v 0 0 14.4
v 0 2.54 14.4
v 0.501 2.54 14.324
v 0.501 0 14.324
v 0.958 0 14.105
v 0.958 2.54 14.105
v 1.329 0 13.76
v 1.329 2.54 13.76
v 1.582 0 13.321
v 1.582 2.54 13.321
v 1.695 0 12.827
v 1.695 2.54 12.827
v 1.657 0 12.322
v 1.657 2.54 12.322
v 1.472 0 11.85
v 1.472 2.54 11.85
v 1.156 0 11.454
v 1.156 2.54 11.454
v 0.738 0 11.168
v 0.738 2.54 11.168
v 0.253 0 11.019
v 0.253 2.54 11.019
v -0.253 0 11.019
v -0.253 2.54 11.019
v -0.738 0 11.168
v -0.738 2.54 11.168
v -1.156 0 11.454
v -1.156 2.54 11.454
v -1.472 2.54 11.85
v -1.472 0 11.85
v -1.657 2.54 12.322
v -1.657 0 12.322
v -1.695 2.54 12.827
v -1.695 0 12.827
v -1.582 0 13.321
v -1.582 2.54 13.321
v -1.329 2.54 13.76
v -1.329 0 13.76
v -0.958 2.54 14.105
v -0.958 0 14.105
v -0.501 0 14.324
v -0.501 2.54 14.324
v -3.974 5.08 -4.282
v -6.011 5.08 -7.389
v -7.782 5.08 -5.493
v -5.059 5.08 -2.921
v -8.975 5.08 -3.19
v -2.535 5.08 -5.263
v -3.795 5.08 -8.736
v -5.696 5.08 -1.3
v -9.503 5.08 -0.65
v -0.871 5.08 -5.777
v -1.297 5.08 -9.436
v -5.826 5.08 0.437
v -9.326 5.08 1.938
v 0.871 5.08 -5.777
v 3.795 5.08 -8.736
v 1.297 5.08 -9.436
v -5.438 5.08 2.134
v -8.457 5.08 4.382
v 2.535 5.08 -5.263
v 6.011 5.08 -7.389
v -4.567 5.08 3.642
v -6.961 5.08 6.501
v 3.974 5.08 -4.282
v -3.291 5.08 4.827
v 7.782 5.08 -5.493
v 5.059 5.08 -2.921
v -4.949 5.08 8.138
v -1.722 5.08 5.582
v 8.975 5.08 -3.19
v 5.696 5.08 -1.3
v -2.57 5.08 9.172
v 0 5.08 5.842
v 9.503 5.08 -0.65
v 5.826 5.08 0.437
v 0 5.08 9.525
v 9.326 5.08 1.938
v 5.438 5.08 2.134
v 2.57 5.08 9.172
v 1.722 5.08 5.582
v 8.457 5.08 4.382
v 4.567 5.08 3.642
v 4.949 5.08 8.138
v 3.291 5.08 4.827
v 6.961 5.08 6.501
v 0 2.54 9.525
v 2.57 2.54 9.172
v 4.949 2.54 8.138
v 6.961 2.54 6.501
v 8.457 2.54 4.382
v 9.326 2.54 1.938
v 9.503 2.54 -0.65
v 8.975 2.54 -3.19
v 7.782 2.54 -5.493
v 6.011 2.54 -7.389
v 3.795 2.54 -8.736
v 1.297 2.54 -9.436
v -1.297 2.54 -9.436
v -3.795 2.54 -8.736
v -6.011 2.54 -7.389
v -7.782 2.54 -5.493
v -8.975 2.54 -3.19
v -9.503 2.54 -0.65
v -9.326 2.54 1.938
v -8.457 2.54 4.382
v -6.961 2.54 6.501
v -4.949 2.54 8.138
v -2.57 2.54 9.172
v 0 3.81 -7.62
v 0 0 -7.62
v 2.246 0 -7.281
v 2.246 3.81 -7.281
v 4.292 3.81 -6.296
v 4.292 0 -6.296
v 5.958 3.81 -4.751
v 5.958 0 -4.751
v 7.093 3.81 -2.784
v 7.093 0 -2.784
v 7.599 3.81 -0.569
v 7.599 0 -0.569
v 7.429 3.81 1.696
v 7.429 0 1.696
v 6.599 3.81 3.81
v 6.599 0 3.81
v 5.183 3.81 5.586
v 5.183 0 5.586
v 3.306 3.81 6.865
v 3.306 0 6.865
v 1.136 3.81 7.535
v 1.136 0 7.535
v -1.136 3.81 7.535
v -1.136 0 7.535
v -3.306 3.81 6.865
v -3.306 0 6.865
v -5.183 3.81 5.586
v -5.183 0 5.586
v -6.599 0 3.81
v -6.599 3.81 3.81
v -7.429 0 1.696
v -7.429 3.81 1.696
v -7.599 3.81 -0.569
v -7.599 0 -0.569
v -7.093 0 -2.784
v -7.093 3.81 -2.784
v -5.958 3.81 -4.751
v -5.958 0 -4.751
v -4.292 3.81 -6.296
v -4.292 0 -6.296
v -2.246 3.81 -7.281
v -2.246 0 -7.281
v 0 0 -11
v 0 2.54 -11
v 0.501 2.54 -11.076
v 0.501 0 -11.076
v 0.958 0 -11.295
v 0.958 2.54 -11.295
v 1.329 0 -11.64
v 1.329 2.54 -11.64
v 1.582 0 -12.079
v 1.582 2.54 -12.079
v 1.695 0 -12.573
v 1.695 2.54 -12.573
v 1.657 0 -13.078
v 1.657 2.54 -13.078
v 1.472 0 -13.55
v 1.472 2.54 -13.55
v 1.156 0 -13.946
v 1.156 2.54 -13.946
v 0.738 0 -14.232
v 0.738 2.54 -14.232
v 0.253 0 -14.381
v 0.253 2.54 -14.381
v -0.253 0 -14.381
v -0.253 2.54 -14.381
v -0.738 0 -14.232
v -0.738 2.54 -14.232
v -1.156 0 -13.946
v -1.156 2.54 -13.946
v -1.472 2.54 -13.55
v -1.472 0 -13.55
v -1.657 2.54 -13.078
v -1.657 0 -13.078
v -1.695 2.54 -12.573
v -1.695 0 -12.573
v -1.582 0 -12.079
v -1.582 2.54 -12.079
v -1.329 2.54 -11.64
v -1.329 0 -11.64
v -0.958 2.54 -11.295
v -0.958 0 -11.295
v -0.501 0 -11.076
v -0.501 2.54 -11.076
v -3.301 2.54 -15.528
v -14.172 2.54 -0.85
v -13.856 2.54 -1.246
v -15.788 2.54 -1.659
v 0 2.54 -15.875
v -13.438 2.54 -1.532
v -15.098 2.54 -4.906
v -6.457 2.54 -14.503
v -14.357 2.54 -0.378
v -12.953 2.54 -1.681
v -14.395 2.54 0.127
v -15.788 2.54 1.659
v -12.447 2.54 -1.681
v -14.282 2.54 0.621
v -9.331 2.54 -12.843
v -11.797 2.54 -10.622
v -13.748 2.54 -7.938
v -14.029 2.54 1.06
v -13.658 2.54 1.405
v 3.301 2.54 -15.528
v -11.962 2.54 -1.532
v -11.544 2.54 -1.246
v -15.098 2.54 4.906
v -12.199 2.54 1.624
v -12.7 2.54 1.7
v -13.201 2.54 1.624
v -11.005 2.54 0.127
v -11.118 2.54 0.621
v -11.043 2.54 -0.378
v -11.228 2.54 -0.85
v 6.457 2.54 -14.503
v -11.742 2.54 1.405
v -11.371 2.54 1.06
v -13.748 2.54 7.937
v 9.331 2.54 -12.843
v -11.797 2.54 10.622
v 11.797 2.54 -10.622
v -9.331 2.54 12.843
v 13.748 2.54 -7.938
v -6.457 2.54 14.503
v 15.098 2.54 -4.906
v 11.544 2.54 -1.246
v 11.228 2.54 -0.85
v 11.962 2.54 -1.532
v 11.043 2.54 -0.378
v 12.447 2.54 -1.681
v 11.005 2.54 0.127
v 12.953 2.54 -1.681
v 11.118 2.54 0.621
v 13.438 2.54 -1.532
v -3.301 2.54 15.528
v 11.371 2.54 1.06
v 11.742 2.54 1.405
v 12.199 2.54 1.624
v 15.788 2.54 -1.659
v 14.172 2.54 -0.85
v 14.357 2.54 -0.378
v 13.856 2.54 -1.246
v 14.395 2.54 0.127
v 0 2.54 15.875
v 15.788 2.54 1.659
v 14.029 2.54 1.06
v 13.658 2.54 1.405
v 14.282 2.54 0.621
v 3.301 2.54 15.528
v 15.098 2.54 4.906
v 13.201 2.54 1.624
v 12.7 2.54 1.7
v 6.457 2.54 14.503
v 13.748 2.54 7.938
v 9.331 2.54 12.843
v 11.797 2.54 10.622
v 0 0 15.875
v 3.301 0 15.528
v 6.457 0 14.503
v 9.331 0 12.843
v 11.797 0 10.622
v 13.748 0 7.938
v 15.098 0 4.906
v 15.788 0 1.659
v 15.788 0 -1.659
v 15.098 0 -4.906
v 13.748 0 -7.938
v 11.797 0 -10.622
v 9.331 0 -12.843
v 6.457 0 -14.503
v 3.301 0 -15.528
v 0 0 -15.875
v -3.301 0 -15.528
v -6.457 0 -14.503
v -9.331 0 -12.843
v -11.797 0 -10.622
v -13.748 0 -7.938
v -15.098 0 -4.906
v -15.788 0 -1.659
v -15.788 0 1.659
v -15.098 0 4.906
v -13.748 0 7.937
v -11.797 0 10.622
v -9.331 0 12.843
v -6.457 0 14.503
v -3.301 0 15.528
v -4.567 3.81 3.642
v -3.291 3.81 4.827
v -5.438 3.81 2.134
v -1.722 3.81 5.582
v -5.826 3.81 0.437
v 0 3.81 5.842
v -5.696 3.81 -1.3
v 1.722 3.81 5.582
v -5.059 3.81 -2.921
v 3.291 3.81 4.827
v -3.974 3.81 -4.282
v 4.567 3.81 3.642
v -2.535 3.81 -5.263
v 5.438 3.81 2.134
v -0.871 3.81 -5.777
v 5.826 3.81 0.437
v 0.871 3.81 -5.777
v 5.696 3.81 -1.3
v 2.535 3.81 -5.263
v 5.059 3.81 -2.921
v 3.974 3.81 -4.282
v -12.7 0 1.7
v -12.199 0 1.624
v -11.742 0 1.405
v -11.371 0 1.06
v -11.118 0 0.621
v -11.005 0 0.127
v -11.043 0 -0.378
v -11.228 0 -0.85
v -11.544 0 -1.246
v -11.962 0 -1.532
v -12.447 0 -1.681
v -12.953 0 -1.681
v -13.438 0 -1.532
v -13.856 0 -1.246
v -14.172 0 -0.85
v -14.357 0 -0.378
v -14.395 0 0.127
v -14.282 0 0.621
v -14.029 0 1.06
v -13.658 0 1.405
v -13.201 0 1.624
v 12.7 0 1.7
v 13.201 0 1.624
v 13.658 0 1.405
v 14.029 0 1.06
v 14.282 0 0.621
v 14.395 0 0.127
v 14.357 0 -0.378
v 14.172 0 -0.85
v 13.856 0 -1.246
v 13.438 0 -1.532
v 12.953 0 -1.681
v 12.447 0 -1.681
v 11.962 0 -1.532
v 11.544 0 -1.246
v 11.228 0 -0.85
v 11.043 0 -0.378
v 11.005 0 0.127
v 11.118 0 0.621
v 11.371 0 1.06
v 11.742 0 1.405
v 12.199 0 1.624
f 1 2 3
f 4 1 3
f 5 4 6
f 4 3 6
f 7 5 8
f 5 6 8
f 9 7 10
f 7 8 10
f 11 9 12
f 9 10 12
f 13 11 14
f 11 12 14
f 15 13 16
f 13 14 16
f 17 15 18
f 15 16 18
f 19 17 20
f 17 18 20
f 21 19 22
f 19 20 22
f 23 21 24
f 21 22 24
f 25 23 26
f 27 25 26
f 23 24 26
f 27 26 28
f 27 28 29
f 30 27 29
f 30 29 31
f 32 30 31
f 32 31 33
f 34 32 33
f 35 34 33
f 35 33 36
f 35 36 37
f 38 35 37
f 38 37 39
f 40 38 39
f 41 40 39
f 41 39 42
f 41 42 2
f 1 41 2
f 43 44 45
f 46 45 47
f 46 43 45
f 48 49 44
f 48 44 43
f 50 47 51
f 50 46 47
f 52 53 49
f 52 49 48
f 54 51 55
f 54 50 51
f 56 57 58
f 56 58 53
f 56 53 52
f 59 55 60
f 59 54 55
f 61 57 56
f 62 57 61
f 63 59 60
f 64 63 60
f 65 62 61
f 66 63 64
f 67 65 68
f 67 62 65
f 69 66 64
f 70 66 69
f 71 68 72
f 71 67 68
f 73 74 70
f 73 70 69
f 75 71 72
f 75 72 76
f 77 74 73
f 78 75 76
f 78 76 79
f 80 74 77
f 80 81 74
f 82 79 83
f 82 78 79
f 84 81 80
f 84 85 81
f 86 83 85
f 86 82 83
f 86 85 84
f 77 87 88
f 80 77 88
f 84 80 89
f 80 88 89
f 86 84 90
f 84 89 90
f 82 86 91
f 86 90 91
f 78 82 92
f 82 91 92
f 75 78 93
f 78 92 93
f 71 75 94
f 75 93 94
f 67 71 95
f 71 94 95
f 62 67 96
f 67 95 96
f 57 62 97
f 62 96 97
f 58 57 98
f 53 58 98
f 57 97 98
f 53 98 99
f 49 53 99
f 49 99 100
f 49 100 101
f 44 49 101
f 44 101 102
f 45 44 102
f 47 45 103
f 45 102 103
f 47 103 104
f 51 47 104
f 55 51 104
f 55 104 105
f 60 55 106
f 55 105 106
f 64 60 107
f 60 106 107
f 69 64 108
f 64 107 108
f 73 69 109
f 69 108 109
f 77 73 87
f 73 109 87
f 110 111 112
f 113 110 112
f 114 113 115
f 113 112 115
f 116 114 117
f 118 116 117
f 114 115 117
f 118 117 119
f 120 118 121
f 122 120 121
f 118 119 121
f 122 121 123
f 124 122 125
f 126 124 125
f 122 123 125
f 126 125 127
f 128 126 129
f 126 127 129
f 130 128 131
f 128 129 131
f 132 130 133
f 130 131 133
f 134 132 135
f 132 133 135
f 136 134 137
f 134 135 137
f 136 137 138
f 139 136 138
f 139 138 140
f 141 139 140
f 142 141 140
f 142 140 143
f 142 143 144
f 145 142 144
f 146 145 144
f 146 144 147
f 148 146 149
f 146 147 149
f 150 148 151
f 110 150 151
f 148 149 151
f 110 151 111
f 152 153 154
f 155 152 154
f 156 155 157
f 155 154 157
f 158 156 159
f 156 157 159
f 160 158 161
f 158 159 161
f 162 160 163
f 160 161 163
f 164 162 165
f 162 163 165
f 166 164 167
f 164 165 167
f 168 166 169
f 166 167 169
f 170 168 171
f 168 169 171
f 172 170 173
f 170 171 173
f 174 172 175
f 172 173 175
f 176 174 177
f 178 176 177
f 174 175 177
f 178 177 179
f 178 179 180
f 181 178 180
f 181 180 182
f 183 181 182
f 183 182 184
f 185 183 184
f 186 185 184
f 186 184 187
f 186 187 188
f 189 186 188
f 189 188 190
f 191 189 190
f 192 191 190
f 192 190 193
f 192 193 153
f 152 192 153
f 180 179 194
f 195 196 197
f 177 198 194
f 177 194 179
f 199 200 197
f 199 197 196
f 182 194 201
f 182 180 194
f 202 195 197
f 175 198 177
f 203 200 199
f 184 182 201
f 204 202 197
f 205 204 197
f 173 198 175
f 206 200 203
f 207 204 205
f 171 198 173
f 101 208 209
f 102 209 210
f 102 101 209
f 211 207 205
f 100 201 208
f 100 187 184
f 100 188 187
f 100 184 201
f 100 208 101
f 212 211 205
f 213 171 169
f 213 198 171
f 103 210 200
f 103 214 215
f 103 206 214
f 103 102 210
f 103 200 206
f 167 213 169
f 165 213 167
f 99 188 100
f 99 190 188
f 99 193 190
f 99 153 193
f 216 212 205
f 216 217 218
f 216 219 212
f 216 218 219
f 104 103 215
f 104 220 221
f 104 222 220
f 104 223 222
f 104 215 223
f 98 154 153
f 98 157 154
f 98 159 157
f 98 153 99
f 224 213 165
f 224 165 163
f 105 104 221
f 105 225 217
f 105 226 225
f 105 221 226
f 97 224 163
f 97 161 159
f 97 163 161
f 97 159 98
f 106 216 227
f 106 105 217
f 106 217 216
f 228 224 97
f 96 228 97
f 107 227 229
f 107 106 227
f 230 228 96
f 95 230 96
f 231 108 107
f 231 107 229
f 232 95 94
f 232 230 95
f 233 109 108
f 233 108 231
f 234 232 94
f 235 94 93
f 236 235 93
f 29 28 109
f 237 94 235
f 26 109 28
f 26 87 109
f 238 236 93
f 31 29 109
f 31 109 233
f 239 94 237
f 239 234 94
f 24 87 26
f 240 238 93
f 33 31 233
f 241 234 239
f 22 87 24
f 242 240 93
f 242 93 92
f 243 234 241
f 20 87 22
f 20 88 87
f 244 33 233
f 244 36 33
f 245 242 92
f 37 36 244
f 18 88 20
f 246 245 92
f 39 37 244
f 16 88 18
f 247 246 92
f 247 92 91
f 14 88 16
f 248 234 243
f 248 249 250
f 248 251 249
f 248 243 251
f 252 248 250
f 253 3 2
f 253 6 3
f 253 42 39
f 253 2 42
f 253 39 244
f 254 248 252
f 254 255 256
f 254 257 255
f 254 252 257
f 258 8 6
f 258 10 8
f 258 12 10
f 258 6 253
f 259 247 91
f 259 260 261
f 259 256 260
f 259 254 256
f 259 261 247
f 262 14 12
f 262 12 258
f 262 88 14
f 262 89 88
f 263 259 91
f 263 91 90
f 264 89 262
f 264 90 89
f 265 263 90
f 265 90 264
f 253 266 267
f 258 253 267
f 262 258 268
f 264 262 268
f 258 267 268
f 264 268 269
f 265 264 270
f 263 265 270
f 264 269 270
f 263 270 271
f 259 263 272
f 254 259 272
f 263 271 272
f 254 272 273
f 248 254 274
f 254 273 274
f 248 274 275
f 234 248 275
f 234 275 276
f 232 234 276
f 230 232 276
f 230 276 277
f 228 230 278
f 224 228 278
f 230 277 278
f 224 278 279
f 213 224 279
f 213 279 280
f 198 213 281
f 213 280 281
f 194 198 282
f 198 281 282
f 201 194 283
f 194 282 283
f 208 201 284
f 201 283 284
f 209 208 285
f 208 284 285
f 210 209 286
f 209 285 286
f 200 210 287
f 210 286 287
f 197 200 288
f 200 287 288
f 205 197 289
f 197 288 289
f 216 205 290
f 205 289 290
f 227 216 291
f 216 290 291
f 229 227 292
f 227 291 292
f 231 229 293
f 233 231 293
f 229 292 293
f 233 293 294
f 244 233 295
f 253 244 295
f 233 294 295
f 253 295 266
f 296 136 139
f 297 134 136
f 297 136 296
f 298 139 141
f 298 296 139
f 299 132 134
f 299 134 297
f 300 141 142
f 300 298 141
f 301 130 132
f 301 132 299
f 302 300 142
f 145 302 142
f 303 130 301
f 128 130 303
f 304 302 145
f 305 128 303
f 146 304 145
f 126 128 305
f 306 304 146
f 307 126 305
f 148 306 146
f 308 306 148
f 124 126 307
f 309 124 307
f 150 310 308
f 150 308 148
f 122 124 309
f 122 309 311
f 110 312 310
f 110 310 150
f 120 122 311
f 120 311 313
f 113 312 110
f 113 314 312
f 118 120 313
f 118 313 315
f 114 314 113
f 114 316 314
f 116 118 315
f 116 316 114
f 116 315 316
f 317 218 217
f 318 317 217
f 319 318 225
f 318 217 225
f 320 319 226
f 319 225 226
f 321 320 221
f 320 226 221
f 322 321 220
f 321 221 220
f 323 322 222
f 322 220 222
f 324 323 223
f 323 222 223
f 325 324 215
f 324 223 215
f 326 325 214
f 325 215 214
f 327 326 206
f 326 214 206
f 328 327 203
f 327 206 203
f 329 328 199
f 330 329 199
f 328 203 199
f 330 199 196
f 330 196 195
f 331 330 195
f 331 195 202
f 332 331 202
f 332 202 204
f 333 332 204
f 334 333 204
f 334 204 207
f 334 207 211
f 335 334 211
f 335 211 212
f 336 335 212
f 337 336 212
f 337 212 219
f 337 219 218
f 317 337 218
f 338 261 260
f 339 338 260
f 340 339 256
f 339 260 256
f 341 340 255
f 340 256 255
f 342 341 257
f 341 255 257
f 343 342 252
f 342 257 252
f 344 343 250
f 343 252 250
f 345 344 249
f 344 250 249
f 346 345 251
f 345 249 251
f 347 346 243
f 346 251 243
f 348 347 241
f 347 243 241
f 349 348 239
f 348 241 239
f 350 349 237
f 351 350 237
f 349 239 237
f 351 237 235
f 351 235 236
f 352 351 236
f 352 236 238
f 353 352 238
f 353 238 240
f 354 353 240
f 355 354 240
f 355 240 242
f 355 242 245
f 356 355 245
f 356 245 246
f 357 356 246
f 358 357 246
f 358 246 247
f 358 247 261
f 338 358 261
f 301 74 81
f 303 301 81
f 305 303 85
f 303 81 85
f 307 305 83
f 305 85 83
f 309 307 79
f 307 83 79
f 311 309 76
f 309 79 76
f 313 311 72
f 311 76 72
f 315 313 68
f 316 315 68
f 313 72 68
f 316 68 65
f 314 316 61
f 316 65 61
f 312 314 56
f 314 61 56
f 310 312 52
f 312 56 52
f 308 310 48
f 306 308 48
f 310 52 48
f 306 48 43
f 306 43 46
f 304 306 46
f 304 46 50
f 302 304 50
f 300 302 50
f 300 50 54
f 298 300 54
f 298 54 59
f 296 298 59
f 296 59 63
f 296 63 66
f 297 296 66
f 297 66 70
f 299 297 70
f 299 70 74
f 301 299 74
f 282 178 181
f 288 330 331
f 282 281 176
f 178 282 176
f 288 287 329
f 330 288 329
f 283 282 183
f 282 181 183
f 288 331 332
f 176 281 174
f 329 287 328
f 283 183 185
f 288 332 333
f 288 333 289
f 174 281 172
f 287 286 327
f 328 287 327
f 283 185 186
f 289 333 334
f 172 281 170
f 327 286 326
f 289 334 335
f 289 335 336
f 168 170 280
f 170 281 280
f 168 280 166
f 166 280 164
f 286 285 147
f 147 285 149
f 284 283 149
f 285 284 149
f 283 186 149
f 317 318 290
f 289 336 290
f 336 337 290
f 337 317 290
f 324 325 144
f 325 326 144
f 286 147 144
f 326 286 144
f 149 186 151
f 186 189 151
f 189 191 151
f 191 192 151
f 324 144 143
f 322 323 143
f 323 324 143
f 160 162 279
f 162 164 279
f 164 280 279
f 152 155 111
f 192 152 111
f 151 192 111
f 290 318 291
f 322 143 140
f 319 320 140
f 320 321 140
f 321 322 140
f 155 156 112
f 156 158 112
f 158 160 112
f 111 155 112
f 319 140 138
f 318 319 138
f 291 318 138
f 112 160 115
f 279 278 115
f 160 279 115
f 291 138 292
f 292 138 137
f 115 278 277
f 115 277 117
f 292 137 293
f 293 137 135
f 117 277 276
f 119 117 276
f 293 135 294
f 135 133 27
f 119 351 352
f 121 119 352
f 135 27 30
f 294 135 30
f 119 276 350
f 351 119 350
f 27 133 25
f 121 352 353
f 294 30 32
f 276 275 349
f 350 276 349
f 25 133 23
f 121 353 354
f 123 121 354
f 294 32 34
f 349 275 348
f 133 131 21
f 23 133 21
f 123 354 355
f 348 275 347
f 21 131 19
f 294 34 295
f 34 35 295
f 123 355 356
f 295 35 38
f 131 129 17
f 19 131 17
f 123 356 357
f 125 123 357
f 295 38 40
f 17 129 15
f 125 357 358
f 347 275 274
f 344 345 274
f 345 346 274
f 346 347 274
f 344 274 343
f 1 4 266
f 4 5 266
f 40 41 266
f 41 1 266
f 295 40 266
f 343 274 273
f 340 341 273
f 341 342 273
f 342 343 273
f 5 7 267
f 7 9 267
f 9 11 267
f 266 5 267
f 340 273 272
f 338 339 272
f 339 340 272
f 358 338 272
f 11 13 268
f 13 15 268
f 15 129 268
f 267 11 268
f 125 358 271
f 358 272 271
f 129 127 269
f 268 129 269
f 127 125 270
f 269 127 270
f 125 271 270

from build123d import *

# Parameters (mm, degrees)
SKETCH1_R           = 15.875
BOSS_EXTRUDE1_DEPTH = 2.54
SKETCH2_R           = 9.525
BOSS_EXTRUDE2_DEPTH = 2.54
SKETCH3_R           = 7.62
CUT_EXTRUDE1_DEPTH  = 3.81
CUT_EXTRUDE2_REACH  = 25.018
SKETCH4_R           = 5.842
CUT_EXTRUDE3_REACH  = 24.594
SKETCH5_R           = 1.7


with BuildPart() as part:
    # Sketch1 → Boss-Extrude1 (new body)
    with BuildSketch(Plane(origin=(0, 0, 0), x_dir=(1, 0, 0), z_dir=(0, 1, 0))):
        with Locations(Location((0, 0, 0), (0, 0, 270))):
            Circle(SKETCH1_R)
    extrude(amount=BOSS_EXTRUDE1_DEPTH)

    # Sketch2 → Boss-Extrude2 (add)
    with BuildSketch(Plane(origin=(0, 2.54, 0), x_dir=(1, 0, 0), z_dir=(0, 1, 0))):
        with Locations(Location((0, 0, 0), (0, 0, 270))):
            Circle(SKETCH2_R)
    extrude(amount=BOSS_EXTRUDE2_DEPTH)

    # Sketch3 → Cut-Extrude1 (cut)
    with BuildSketch(Plane.XZ):
        with Locations(Location((0, 0, 0), (0, 0, 270))):
            Circle(SKETCH3_R)
    extrude(amount=-CUT_EXTRUDE1_DEPTH, mode=Mode.SUBTRACT)

    # Sketch4 → Cut-Extrude2 (cut, up to next)
    with BuildSketch(Plane(origin=(0, 5.08, 0), x_dir=(1, 0, 0), z_dir=(0, 1, 0)), mode=Mode.PRIVATE) as cut_extrude2_sk1:
        with Locations(Location((0, 0, 0), (0, 0, 270))):
            Circle(SKETCH4_R)
    cut_extrude2_tool1 = extrude(cut_extrude2_sk1.sketch, amount=-CUT_EXTRUDE2_REACH, mode=Mode.PRIVATE) & part.part
    add(cut_extrude2_tool1.solids().sort_by_distance((0, 5.08, 0))[0], mode=Mode.SUBTRACT)

    # Sketch5 → Cut-Extrude3 (cut, up to next)
    with BuildSketch(Plane(origin=(0, 2.54, 0), x_dir=(1, 0, 0), z_dir=(0, 1, 0)), mode=Mode.PRIVATE) as cut_extrude3_sk1:
        with Locations(Location((0, 12.7, 0), (0, 0, 270))):
            Circle(SKETCH5_R)
    cut_extrude3_tool1 = extrude(cut_extrude3_sk1.sketch, amount=-CUT_EXTRUDE3_REACH, mode=Mode.PRIVATE) & part.part
    # Sketch5 → Cut-Extrude3 (cut, up to next)
    with BuildSketch(Plane(origin=(0, 2.54, 0), x_dir=(1, 0, 0), z_dir=(0, 1, 0)), mode=Mode.PRIVATE) as cut_extrude3_sk2:
        with Locations(Location((12.7, 0, 0), (0, 0, 270))):
            Circle(SKETCH5_R)
    cut_extrude3_tool2 = extrude(cut_extrude3_sk2.sketch, amount=-CUT_EXTRUDE3_REACH, mode=Mode.PRIVATE) & part.part
    # Sketch5 → Cut-Extrude3 (cut, up to next)
    with BuildSketch(Plane(origin=(0, 2.54, 0), x_dir=(1, 0, 0), z_dir=(0, 1, 0)), mode=Mode.PRIVATE) as cut_extrude3_sk3:
        with Locations(Location((0, -12.7, 0), (0, 0, 270))):
            Circle(SKETCH5_R)
    cut_extrude3_tool3 = extrude(cut_extrude3_sk3.sketch, amount=-CUT_EXTRUDE3_REACH, mode=Mode.PRIVATE) & part.part
    # Sketch5 → Cut-Extrude3 (cut, up to next)
    with BuildSketch(Plane(origin=(0, 2.54, 0), x_dir=(1, 0, 0), z_dir=(0, 1, 0)), mode=Mode.PRIVATE) as cut_extrude3_sk4:
        with Locations(Location((-12.7, 0, 0), (0, 0, 270))):
            Circle(SKETCH5_R)
    cut_extrude3_tool4 = extrude(cut_extrude3_sk4.sketch, amount=-CUT_EXTRUDE3_REACH, mode=Mode.PRIVATE) & part.part
    add(cut_extrude3_tool1.solids().sort_by_distance((0, 2.54, -12.7))[0], mode=Mode.SUBTRACT)
    add(cut_extrude3_tool2.solids().sort_by_distance((12.7, 2.54, 0))[0], mode=Mode.SUBTRACT)
    add(cut_extrude3_tool3.solids().sort_by_distance((0, 2.54, 12.7))[0], mode=Mode.SUBTRACT)
    add(cut_extrude3_tool4.solids().sort_by_distance((-12.7, 2.54, 0))[0], mode=Mode.SUBTRACT)


solid = part.part
